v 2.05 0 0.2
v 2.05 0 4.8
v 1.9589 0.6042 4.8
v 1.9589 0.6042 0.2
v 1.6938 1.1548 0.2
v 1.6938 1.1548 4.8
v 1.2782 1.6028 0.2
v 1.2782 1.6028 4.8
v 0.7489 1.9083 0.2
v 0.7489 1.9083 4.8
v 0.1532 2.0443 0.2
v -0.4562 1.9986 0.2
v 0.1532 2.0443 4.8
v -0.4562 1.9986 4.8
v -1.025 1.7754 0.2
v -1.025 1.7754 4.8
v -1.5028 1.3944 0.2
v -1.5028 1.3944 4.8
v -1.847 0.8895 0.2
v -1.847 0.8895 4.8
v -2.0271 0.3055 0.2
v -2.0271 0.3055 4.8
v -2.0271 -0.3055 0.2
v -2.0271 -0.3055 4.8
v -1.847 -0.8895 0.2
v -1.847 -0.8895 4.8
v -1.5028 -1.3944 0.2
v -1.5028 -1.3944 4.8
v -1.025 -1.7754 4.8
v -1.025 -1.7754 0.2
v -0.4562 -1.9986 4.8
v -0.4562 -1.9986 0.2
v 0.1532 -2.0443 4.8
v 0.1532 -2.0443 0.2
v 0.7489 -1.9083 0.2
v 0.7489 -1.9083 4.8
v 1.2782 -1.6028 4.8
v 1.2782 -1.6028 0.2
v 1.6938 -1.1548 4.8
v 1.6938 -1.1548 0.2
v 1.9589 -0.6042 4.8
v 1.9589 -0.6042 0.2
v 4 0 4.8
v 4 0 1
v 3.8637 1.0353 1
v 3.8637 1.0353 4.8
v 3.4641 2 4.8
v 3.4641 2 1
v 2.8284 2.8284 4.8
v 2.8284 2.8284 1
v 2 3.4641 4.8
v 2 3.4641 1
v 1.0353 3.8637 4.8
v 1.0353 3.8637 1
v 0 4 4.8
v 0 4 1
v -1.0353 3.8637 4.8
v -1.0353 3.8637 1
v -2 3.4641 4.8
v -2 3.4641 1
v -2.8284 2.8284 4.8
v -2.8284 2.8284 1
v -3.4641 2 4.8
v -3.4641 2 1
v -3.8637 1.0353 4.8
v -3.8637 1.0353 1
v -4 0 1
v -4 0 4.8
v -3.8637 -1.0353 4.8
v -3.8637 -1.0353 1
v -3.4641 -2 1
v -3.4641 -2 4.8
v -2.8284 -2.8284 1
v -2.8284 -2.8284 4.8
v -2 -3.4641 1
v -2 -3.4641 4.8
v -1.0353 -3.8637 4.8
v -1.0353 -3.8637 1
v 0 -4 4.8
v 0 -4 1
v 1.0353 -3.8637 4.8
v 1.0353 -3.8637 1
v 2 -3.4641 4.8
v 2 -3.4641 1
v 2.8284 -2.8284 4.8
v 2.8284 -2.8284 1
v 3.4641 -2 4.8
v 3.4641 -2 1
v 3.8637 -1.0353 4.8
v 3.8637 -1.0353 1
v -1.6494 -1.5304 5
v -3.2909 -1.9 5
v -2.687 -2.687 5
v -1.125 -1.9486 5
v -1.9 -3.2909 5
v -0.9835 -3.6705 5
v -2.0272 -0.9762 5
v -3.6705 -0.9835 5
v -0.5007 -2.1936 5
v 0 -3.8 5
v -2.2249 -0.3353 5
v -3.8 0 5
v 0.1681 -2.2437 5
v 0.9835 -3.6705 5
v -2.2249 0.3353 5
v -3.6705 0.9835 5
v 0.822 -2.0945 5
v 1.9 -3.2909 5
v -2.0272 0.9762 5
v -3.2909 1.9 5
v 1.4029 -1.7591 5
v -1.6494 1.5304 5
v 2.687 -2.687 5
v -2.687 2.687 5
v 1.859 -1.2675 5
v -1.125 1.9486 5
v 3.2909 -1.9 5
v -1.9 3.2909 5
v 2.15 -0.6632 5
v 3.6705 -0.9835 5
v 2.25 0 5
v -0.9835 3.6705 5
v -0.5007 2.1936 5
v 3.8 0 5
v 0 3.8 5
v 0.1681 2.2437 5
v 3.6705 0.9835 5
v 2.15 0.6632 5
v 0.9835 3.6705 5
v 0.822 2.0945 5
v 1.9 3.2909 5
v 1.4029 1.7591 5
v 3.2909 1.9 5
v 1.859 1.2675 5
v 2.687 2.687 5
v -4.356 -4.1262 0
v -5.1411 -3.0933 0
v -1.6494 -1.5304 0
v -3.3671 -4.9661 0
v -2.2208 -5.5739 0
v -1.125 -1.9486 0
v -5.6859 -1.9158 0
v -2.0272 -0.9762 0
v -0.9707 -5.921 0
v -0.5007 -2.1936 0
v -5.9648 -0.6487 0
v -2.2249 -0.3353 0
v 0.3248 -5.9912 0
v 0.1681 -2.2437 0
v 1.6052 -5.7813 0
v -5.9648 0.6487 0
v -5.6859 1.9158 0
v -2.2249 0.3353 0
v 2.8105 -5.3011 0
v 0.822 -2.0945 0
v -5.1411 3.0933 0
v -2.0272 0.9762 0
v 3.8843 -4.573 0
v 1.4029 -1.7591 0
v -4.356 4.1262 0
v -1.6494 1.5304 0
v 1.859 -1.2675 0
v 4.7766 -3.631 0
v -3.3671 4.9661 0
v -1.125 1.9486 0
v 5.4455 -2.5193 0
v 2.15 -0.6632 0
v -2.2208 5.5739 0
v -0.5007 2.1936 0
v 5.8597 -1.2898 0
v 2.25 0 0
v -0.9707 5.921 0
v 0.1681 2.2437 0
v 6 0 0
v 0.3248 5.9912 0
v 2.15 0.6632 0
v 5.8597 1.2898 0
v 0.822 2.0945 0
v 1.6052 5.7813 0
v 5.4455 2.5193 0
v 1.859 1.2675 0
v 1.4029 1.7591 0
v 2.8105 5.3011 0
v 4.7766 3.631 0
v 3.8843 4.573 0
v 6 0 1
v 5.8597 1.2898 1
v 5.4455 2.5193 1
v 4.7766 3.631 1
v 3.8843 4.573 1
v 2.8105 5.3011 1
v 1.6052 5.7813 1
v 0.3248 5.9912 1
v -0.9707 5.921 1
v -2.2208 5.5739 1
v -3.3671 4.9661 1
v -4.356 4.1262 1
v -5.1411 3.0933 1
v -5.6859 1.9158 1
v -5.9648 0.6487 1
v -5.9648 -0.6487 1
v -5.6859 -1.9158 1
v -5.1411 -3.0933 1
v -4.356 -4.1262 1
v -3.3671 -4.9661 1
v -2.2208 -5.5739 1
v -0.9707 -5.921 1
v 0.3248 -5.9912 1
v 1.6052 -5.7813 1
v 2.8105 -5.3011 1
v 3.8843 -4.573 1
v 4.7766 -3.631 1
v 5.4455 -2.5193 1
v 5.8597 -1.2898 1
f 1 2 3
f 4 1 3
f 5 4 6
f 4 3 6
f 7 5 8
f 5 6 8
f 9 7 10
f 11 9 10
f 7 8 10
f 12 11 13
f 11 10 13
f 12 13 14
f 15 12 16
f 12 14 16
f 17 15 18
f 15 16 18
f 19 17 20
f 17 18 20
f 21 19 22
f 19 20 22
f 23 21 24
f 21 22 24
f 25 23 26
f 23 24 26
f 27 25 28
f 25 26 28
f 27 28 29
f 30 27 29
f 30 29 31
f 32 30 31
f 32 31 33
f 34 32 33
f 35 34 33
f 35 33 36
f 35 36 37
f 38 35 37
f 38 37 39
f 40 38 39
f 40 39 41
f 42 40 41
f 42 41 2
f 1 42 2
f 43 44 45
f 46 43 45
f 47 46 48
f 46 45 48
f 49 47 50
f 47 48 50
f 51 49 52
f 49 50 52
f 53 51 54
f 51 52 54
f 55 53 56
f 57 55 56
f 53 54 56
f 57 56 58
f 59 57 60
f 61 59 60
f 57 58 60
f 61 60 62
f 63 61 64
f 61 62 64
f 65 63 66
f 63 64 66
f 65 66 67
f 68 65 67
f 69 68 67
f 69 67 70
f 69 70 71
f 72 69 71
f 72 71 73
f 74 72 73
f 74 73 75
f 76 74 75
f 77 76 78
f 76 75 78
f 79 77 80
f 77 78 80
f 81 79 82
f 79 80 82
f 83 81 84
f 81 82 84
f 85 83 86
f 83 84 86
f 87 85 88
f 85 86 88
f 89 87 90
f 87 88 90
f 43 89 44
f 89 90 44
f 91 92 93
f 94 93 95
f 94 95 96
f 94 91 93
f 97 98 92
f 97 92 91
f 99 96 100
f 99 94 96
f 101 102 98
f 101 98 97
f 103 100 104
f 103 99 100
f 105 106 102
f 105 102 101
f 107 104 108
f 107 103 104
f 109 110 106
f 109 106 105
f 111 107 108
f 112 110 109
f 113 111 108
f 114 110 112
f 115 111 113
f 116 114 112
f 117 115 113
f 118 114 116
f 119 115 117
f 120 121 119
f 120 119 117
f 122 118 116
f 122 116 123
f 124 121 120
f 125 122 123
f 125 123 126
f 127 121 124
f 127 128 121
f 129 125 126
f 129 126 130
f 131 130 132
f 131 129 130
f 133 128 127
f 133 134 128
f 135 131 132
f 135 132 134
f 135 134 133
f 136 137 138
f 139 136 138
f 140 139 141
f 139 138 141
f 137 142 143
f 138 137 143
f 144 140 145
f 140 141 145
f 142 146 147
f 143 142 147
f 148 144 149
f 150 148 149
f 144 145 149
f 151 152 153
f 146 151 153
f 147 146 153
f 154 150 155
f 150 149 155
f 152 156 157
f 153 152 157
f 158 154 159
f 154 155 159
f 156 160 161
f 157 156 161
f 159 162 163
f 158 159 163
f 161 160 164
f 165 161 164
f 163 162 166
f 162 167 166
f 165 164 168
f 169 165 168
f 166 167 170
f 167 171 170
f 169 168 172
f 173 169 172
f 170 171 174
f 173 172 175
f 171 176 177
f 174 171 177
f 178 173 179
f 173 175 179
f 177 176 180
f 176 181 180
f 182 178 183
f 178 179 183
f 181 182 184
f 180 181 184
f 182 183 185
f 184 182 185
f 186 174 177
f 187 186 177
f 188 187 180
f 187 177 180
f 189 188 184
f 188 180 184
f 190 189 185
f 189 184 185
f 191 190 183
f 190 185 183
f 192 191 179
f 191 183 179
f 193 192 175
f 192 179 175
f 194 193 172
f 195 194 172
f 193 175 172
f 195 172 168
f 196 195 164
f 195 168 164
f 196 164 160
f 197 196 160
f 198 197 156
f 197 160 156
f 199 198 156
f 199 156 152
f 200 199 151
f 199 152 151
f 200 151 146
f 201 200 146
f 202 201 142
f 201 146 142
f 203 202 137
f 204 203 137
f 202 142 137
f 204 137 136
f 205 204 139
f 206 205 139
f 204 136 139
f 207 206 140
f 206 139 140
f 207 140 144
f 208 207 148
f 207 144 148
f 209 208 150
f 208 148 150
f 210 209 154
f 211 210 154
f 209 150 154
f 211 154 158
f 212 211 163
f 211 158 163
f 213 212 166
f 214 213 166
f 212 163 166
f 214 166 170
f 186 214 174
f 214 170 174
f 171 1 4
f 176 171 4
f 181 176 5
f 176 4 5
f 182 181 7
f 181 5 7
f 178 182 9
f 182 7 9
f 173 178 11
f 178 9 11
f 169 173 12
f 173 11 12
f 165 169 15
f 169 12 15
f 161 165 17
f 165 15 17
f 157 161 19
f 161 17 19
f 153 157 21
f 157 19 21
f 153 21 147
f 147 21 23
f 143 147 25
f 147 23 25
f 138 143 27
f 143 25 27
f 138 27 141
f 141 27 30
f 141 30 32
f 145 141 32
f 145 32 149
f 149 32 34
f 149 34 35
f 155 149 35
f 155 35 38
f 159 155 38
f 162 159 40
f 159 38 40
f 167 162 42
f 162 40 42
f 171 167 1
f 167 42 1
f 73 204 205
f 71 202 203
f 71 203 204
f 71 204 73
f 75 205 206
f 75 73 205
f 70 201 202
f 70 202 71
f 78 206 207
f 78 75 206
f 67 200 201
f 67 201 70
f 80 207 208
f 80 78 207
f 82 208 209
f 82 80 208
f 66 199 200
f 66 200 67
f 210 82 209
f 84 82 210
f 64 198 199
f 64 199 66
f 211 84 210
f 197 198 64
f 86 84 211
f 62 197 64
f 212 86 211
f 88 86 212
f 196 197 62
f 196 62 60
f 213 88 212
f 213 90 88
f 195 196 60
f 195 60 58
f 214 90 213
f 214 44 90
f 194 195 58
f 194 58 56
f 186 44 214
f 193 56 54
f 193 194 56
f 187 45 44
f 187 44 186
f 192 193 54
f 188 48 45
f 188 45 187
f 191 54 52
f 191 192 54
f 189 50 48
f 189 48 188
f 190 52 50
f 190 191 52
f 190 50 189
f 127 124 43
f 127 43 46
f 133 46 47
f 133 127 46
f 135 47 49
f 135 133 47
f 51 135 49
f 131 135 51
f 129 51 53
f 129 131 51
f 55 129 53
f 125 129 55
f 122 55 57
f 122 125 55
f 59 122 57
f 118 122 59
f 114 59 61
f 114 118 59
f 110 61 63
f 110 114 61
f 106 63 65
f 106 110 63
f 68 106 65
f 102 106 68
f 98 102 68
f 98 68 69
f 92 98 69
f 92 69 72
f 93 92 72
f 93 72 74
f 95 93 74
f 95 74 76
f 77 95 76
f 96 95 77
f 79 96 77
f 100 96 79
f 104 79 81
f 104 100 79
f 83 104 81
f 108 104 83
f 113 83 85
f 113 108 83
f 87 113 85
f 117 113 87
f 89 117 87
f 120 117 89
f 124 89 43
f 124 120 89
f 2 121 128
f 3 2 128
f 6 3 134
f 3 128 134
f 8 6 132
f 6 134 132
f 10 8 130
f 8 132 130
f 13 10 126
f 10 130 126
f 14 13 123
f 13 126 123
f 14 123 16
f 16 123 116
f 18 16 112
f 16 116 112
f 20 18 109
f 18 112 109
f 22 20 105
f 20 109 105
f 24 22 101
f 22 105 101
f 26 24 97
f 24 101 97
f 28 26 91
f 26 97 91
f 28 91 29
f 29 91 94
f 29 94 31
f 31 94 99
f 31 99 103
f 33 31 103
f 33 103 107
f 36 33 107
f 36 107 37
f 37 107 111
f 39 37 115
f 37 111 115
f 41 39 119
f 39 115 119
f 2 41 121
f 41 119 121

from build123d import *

# Parameters (mm, degrees)
SKETCH_1_R          = 6
EXTRUDE_1_DEPTH     = 1
SKETCH_2_R          = 4
EXTRUDE_2_DEPTH     = 4
SKETCH_3_R          = 2.05
CUT_EXTRUDE_1_DEPTH = 10.848857802
CHAMFER_1_SIZE      = 0.2


with BuildPart() as part:
    # 草图1 → 凸台-拉伸1 (new body)
    with BuildSketch(Plane.XY):
        Circle(SKETCH_1_R)
    extrude(amount=EXTRUDE_1_DEPTH)

    # 草图2 → 凸台-拉伸2 (add)
    with BuildSketch(Plane.XY.offset(1)):
        Circle(SKETCH_2_R)
    extrude(amount=EXTRUDE_2_DEPTH)

    # 草图3 → 切除-拉伸1 (cut, through all)
    with BuildSketch(Plane.XY.offset(5)):
        Circle(SKETCH_3_R)
    extrude(amount=-CUT_EXTRUDE_1_DEPTH, mode=Mode.SUBTRACT)

    # 倒角1
    chamfer_1_edges = [part.edges().sort_by_distance(p)[0] for p in [
        (-2.05, 0, 0),
        (-2.05, 0, 5),
        (-4, 0, 5),
    ]]
    chamfer(chamfer_1_edges, length=CHAMFER_1_SIZE)


solid = part.part
